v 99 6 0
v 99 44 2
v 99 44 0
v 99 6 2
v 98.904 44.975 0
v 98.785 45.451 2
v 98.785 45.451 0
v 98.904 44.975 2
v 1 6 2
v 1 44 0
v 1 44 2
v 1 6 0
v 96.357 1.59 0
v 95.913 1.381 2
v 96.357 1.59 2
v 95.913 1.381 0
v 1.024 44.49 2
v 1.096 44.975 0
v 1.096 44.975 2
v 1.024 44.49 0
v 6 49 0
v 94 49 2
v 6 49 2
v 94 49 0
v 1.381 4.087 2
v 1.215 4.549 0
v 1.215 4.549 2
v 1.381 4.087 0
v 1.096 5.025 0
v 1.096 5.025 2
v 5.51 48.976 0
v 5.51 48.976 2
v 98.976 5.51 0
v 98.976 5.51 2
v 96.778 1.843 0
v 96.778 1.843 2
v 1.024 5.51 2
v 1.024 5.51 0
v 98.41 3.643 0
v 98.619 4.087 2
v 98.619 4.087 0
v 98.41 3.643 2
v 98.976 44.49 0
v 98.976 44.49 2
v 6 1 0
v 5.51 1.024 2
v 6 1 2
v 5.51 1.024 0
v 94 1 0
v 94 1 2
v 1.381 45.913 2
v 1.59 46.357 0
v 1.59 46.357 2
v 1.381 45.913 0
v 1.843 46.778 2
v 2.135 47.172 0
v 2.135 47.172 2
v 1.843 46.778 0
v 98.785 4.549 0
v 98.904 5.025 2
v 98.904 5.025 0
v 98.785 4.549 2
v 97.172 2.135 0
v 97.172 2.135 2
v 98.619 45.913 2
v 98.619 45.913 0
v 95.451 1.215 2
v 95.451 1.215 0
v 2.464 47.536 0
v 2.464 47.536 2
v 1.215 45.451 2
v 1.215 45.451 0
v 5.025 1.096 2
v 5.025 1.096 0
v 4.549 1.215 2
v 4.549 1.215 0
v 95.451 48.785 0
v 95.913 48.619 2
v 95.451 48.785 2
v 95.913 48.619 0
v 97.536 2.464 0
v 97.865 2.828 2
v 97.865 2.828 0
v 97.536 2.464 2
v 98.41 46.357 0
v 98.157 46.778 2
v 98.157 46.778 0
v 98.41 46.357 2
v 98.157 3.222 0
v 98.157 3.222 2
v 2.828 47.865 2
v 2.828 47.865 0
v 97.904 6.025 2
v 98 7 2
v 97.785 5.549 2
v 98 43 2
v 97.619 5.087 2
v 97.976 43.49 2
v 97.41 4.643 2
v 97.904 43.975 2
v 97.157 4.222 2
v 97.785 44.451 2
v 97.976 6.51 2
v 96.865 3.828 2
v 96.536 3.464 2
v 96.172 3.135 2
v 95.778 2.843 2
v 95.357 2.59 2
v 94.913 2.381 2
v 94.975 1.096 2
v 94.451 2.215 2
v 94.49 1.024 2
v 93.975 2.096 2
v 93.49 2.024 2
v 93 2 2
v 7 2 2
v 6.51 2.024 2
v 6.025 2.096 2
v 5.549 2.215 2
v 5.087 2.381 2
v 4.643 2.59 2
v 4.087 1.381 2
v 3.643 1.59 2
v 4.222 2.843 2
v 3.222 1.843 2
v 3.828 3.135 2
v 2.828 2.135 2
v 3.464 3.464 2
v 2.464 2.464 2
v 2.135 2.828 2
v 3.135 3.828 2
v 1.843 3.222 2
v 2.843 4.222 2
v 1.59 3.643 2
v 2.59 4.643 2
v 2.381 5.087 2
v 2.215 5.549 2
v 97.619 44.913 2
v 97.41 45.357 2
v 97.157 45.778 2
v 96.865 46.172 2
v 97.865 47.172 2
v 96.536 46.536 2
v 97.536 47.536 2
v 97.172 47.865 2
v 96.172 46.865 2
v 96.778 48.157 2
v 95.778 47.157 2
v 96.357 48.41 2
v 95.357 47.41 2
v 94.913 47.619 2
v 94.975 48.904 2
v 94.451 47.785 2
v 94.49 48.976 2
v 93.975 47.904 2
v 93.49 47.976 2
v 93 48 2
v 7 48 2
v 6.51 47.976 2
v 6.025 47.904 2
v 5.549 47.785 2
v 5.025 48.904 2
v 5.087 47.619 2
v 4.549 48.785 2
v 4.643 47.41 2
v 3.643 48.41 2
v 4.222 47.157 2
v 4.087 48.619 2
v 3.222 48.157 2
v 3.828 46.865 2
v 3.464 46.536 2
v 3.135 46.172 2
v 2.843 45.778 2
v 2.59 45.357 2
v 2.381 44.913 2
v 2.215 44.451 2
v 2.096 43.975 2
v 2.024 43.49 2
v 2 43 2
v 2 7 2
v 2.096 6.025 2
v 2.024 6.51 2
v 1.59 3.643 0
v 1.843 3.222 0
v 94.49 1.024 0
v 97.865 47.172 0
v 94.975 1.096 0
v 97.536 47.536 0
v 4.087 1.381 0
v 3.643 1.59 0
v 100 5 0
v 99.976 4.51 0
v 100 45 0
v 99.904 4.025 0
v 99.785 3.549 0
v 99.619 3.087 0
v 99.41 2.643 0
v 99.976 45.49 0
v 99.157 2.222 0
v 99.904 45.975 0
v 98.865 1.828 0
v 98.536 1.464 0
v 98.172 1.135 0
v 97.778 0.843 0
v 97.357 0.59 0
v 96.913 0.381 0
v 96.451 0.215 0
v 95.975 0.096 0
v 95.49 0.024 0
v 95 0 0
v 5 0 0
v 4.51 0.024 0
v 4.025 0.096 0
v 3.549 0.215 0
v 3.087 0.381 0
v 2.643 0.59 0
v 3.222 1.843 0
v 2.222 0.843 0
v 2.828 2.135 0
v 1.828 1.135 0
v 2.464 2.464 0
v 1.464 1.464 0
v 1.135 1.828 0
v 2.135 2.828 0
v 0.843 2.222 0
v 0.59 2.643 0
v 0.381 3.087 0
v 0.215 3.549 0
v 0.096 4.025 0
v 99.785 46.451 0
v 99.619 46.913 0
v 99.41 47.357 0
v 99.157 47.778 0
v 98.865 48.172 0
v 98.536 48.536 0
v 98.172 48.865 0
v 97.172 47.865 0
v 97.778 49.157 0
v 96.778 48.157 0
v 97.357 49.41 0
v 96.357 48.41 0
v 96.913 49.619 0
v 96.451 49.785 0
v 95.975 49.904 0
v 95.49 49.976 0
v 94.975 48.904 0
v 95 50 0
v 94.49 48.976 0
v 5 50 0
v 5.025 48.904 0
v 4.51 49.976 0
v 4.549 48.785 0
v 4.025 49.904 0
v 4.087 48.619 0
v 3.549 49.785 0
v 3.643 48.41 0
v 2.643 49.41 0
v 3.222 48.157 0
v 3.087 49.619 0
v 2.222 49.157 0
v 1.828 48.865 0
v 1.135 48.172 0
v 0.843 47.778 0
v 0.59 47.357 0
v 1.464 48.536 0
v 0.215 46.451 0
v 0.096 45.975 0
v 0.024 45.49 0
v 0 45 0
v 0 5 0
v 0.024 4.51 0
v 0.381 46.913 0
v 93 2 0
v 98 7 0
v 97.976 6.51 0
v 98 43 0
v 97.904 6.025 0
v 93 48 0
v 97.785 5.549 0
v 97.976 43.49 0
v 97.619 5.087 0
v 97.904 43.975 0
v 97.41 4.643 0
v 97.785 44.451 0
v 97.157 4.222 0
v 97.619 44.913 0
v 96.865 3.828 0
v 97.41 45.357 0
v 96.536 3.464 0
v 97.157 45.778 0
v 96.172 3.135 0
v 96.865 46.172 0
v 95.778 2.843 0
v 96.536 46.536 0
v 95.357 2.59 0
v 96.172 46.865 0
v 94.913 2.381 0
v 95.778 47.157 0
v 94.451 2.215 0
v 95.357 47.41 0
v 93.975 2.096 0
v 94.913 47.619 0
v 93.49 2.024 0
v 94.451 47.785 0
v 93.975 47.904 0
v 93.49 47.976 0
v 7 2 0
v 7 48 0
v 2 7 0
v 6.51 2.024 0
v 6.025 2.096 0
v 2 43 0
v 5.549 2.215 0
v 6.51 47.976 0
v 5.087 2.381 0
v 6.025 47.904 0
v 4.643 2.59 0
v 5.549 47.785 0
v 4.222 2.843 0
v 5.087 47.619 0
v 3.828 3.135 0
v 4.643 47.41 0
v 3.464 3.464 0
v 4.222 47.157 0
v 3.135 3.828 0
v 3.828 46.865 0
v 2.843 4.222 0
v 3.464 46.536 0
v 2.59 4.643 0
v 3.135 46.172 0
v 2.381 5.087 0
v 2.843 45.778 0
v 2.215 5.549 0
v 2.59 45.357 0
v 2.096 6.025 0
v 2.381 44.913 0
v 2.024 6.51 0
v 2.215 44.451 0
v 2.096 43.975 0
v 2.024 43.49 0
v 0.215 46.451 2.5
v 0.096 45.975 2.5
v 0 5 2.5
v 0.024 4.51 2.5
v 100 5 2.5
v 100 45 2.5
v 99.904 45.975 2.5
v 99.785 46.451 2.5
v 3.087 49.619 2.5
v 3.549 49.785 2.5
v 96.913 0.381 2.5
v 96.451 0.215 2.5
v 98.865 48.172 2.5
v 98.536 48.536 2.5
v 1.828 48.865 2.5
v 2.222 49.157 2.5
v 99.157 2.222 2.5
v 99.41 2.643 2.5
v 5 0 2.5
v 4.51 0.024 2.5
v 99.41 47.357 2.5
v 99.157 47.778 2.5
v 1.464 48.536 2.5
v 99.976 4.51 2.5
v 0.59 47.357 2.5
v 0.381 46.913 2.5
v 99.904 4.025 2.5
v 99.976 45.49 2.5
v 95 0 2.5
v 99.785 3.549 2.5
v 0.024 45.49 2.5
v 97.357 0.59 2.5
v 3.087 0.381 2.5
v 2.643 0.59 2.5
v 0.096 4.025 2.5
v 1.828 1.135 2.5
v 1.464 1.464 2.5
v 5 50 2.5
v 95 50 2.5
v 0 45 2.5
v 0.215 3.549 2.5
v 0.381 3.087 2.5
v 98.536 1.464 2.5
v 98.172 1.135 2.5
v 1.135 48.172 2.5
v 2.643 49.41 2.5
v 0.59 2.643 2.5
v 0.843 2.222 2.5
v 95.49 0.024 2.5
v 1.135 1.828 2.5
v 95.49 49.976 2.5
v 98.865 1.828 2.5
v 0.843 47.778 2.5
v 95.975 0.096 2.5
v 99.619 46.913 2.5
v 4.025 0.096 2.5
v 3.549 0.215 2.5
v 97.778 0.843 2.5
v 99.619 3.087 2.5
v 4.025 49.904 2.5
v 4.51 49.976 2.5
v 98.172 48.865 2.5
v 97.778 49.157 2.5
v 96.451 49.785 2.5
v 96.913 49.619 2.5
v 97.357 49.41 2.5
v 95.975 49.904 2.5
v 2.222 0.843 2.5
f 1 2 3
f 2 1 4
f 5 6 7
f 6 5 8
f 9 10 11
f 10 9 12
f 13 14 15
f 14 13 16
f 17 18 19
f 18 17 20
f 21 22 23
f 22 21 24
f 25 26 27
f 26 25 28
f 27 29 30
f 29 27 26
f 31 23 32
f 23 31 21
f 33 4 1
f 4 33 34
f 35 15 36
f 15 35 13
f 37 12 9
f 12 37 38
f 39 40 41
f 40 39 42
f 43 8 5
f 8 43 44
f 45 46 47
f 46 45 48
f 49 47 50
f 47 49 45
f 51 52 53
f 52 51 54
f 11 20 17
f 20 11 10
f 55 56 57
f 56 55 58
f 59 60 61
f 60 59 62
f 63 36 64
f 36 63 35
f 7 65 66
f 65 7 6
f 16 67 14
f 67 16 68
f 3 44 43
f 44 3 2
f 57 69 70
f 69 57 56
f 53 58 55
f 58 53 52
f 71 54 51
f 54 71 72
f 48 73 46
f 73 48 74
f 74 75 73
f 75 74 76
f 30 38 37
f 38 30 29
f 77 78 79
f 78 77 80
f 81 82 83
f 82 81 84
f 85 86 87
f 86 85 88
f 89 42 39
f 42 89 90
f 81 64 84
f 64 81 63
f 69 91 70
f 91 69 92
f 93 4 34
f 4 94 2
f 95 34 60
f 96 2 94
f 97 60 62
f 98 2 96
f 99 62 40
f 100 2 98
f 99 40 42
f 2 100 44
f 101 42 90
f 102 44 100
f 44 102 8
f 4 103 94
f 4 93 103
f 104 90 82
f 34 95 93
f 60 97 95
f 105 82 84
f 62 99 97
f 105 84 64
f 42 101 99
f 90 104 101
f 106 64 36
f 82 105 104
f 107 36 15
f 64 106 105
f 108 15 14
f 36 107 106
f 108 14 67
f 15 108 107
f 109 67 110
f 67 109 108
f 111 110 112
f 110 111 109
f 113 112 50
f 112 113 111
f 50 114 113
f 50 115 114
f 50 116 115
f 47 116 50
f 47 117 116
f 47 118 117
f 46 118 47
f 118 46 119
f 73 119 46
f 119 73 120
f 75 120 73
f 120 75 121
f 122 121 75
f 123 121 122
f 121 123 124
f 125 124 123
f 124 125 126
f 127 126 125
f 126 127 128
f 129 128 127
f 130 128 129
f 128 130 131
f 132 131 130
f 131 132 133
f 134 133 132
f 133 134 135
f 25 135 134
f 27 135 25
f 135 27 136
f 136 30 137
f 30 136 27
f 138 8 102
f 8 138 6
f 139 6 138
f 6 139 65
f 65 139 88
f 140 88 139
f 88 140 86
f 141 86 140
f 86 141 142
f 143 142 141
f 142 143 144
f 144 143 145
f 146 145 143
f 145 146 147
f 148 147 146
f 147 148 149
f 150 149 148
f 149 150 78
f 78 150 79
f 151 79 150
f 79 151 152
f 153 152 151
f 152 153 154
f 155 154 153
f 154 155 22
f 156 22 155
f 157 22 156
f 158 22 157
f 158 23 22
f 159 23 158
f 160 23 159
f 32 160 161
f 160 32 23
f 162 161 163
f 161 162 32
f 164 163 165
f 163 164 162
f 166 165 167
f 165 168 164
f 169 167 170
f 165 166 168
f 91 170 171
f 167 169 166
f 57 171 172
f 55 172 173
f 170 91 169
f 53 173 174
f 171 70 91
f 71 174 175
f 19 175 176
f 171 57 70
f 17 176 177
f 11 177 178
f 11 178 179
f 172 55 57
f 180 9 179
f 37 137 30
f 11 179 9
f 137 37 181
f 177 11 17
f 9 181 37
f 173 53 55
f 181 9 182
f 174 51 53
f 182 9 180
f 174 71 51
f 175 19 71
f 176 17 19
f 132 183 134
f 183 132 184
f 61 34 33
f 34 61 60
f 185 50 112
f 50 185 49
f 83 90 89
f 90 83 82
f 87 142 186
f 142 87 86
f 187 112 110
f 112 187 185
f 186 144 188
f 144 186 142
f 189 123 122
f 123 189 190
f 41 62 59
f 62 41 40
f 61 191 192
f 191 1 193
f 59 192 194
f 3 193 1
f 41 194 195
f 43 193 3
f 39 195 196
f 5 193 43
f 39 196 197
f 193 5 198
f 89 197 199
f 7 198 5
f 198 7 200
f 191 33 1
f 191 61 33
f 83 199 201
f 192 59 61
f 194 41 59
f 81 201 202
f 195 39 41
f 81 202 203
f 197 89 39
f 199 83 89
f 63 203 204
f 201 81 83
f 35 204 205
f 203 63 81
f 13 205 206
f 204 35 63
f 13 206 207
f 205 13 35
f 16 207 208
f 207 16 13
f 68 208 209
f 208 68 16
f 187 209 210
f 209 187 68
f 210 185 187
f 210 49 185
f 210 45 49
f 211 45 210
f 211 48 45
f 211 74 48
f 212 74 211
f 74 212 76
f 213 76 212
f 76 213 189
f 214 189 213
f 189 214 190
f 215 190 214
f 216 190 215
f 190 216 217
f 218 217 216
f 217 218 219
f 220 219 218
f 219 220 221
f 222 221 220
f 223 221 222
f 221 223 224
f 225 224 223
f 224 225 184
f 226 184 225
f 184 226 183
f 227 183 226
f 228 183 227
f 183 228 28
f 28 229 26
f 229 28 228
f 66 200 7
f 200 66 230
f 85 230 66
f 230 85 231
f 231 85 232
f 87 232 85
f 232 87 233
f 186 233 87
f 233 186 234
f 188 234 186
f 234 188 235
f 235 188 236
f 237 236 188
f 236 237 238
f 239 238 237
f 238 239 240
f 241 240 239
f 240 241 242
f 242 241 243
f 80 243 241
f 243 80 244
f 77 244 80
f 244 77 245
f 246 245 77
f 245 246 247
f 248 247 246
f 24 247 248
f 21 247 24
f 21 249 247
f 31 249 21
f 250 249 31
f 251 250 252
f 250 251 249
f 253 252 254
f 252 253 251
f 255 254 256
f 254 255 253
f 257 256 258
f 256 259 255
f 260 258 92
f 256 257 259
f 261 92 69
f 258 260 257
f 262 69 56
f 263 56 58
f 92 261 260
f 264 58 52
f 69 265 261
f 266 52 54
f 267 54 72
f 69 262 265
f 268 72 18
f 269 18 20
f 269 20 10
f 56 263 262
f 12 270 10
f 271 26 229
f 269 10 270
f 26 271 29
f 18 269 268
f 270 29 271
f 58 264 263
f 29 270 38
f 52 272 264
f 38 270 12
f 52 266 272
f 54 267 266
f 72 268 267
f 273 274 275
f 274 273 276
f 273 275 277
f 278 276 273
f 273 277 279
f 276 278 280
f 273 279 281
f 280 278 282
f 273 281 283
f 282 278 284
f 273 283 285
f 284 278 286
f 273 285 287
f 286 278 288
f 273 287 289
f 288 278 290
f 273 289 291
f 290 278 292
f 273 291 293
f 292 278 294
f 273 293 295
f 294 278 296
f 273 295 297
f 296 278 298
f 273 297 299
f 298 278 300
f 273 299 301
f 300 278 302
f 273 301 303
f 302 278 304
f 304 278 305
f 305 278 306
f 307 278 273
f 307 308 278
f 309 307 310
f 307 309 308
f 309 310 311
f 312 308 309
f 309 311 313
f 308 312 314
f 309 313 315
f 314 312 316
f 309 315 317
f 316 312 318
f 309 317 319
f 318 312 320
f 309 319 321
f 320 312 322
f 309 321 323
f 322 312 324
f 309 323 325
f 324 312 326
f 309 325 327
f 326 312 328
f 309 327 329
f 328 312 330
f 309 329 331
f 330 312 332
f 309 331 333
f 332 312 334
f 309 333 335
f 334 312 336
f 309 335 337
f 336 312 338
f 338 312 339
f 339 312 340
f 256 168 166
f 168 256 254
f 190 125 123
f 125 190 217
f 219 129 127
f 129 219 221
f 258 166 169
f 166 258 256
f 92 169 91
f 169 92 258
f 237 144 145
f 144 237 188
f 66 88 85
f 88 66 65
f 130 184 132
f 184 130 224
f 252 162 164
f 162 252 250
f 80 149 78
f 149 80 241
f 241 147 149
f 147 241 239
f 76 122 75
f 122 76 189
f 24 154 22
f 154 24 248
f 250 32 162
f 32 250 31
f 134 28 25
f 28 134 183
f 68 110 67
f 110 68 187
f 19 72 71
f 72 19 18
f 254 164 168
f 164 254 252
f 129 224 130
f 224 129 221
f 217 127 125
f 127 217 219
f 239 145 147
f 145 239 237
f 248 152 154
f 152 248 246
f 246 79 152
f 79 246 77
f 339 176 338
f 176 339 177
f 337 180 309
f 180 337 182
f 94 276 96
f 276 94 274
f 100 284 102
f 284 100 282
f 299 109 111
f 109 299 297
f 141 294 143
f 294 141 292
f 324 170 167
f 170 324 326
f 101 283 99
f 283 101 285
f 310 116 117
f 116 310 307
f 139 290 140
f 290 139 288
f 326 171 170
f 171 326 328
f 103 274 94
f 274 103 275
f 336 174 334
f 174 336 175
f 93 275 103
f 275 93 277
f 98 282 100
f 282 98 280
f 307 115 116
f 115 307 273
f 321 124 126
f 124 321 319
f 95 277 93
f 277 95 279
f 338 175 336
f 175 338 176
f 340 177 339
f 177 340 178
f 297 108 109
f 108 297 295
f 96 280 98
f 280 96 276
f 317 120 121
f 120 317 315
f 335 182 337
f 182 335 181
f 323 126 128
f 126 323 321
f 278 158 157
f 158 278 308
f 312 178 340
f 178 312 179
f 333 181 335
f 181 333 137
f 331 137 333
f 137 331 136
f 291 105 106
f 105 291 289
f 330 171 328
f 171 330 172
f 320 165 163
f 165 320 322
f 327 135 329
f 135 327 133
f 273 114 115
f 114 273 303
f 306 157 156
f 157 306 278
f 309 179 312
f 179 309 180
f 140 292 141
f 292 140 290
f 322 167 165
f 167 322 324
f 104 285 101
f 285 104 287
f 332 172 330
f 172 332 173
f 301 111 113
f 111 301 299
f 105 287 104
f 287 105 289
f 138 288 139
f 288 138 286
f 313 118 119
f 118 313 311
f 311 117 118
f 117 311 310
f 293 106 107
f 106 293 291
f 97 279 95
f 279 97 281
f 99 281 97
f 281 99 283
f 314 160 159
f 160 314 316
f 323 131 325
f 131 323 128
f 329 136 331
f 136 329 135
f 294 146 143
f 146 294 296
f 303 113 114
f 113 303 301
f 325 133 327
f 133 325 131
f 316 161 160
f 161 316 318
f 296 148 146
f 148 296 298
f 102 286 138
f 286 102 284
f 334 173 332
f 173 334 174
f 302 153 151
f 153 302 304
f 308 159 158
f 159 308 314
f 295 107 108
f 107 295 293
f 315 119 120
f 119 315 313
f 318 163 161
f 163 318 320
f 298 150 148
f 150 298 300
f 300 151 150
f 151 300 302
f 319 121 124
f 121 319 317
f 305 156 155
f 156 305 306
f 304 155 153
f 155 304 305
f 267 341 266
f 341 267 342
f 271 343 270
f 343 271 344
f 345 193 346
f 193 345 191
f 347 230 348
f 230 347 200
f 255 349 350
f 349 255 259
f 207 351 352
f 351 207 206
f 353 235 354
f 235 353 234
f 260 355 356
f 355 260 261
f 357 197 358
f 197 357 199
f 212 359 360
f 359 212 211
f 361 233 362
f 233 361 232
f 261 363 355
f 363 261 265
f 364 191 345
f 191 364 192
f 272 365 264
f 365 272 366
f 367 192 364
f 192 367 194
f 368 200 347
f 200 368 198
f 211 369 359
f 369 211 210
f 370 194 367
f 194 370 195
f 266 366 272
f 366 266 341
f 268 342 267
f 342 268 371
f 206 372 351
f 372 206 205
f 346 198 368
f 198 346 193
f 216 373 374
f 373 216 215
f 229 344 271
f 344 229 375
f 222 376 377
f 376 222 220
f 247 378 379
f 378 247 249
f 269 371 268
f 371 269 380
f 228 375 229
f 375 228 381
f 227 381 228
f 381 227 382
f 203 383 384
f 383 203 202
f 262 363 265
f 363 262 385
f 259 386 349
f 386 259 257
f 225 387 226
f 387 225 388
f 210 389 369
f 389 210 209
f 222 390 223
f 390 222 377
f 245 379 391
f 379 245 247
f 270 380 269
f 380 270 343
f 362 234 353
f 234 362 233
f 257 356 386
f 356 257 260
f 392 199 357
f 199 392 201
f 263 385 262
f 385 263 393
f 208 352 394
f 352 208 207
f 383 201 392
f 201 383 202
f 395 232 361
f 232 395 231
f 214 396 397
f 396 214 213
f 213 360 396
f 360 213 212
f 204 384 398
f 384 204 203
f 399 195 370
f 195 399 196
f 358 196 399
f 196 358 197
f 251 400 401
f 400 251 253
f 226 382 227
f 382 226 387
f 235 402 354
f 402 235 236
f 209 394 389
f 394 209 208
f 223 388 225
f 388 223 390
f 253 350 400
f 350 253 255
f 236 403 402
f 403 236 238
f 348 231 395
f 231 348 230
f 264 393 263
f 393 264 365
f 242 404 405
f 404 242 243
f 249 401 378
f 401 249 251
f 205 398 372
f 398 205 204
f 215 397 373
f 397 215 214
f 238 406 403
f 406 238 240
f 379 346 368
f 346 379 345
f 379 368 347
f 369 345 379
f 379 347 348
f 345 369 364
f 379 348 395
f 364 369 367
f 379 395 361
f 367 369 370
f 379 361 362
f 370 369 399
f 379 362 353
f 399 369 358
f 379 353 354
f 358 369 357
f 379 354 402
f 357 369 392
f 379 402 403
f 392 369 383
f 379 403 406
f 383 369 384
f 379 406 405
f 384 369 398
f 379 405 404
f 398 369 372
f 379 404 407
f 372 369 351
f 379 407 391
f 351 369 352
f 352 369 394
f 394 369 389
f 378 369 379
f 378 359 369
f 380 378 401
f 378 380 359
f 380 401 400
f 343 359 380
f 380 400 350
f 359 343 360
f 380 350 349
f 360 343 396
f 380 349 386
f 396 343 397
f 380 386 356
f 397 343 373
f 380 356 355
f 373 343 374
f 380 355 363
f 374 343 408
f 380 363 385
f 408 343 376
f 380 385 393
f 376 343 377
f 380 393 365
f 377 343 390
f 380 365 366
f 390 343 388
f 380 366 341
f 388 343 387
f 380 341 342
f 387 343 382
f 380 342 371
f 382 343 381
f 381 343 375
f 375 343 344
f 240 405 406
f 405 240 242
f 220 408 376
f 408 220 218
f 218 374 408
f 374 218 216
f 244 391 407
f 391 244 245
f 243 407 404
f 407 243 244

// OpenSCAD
// ========================
// Parameters
// ========================
corner_r = 5;    // PCB corner radius

wall_thickness = 2;  // Wall thickness
$fn = 64;              // smooth corners


// Case
case_width = 100;
case_length = 50;
case_height = 2.5;

border_height = 2;

// Outer cylinder
outer_r = 3;
outer_h = 4;

// Inner hole
hole_r = 3;
hole_h = 2;

// USB-C connector
usbc_l = 10;
usbc_h = 5;

// LED
led_r = 5;

// increase for smoother cone ($fn)
segments = 64;

net = false;

// ========================
// Case Top Module
// ========================
module case_top() {

    // Translate so inner PCB pocket starts at (0,0)
    translate([corner_r, corner_r, 0]) {
        difference() {
            
            // Outer shell (walls included)
            linear_extrude(height = case_height)
                rounded_rect(case_width,
                             case_length,
                             corner_r);
            
            border_bottom();
        }
    }
}

module border_bottom() {
    difference() {
        // Top hollow interior
        translate([1, 1, 0])
            linear_extrude(height = border_height)
                rounded_rect(case_width-2, case_length-2, corner_r);
        translate([2, 2, 0])
            linear_extrude(height = border_height)
                rounded_rect(case_width-4, case_length-4, corner_r);
        
    }
}

// ========================
// Rounded rectangle module
// ========================
module rounded_rect(x, y, radius) {
    minkowski() {
        square([x - 2*radius, y - 2*radius], center = false);
        circle(r = radius, $fn = $fn);
    }
}

// Helper functions
function sum_first(arr, n) =
    n == 0 ? 0 : arr[n - 1] + sum_first(arr, n - 1);

// ========================
// Top case
// ========================

case_top();

// -------------------- PARAMETERS --------------------
ratios = [1];   // must sum to 1

availableSpace = case_width-2*wall_thickness;             // total X space
//wall_thickness = 3;               // x
//case_length = 100;                // y
//case_height = 50;                 // z

wall_height = case_height - 2 - 2.5;

echo("Total: ");
echo(availableSpace);

// -------------------- WALL GENERATION --------------------
if (1 < len(ratios)) {
    for (i = [0 : len(ratios) - 2]) {   // no wall for last element

        space = ratios[i] * availableSpace;

        // cumulative space before this element
        x_cursor = sum_first(
            [for (j = [0 : len(ratios) - 1]) ratios[j] * availableSpace],
            i
        ) + len(ratios)-1 * wall_thickness;

        wall_pos = x_cursor + space - wall_thickness / 2;

        echo("i =", i);
        echo("space =", space);
        echo("x_cursor =", x_cursor);
        echo("wall_pos =", wall_pos);

        translate([
            wall_pos,
            0,
            2.5
        ])
            cube([
                wall_thickness,
                case_length - 2,
                wall_height
            ]);
    }
}
